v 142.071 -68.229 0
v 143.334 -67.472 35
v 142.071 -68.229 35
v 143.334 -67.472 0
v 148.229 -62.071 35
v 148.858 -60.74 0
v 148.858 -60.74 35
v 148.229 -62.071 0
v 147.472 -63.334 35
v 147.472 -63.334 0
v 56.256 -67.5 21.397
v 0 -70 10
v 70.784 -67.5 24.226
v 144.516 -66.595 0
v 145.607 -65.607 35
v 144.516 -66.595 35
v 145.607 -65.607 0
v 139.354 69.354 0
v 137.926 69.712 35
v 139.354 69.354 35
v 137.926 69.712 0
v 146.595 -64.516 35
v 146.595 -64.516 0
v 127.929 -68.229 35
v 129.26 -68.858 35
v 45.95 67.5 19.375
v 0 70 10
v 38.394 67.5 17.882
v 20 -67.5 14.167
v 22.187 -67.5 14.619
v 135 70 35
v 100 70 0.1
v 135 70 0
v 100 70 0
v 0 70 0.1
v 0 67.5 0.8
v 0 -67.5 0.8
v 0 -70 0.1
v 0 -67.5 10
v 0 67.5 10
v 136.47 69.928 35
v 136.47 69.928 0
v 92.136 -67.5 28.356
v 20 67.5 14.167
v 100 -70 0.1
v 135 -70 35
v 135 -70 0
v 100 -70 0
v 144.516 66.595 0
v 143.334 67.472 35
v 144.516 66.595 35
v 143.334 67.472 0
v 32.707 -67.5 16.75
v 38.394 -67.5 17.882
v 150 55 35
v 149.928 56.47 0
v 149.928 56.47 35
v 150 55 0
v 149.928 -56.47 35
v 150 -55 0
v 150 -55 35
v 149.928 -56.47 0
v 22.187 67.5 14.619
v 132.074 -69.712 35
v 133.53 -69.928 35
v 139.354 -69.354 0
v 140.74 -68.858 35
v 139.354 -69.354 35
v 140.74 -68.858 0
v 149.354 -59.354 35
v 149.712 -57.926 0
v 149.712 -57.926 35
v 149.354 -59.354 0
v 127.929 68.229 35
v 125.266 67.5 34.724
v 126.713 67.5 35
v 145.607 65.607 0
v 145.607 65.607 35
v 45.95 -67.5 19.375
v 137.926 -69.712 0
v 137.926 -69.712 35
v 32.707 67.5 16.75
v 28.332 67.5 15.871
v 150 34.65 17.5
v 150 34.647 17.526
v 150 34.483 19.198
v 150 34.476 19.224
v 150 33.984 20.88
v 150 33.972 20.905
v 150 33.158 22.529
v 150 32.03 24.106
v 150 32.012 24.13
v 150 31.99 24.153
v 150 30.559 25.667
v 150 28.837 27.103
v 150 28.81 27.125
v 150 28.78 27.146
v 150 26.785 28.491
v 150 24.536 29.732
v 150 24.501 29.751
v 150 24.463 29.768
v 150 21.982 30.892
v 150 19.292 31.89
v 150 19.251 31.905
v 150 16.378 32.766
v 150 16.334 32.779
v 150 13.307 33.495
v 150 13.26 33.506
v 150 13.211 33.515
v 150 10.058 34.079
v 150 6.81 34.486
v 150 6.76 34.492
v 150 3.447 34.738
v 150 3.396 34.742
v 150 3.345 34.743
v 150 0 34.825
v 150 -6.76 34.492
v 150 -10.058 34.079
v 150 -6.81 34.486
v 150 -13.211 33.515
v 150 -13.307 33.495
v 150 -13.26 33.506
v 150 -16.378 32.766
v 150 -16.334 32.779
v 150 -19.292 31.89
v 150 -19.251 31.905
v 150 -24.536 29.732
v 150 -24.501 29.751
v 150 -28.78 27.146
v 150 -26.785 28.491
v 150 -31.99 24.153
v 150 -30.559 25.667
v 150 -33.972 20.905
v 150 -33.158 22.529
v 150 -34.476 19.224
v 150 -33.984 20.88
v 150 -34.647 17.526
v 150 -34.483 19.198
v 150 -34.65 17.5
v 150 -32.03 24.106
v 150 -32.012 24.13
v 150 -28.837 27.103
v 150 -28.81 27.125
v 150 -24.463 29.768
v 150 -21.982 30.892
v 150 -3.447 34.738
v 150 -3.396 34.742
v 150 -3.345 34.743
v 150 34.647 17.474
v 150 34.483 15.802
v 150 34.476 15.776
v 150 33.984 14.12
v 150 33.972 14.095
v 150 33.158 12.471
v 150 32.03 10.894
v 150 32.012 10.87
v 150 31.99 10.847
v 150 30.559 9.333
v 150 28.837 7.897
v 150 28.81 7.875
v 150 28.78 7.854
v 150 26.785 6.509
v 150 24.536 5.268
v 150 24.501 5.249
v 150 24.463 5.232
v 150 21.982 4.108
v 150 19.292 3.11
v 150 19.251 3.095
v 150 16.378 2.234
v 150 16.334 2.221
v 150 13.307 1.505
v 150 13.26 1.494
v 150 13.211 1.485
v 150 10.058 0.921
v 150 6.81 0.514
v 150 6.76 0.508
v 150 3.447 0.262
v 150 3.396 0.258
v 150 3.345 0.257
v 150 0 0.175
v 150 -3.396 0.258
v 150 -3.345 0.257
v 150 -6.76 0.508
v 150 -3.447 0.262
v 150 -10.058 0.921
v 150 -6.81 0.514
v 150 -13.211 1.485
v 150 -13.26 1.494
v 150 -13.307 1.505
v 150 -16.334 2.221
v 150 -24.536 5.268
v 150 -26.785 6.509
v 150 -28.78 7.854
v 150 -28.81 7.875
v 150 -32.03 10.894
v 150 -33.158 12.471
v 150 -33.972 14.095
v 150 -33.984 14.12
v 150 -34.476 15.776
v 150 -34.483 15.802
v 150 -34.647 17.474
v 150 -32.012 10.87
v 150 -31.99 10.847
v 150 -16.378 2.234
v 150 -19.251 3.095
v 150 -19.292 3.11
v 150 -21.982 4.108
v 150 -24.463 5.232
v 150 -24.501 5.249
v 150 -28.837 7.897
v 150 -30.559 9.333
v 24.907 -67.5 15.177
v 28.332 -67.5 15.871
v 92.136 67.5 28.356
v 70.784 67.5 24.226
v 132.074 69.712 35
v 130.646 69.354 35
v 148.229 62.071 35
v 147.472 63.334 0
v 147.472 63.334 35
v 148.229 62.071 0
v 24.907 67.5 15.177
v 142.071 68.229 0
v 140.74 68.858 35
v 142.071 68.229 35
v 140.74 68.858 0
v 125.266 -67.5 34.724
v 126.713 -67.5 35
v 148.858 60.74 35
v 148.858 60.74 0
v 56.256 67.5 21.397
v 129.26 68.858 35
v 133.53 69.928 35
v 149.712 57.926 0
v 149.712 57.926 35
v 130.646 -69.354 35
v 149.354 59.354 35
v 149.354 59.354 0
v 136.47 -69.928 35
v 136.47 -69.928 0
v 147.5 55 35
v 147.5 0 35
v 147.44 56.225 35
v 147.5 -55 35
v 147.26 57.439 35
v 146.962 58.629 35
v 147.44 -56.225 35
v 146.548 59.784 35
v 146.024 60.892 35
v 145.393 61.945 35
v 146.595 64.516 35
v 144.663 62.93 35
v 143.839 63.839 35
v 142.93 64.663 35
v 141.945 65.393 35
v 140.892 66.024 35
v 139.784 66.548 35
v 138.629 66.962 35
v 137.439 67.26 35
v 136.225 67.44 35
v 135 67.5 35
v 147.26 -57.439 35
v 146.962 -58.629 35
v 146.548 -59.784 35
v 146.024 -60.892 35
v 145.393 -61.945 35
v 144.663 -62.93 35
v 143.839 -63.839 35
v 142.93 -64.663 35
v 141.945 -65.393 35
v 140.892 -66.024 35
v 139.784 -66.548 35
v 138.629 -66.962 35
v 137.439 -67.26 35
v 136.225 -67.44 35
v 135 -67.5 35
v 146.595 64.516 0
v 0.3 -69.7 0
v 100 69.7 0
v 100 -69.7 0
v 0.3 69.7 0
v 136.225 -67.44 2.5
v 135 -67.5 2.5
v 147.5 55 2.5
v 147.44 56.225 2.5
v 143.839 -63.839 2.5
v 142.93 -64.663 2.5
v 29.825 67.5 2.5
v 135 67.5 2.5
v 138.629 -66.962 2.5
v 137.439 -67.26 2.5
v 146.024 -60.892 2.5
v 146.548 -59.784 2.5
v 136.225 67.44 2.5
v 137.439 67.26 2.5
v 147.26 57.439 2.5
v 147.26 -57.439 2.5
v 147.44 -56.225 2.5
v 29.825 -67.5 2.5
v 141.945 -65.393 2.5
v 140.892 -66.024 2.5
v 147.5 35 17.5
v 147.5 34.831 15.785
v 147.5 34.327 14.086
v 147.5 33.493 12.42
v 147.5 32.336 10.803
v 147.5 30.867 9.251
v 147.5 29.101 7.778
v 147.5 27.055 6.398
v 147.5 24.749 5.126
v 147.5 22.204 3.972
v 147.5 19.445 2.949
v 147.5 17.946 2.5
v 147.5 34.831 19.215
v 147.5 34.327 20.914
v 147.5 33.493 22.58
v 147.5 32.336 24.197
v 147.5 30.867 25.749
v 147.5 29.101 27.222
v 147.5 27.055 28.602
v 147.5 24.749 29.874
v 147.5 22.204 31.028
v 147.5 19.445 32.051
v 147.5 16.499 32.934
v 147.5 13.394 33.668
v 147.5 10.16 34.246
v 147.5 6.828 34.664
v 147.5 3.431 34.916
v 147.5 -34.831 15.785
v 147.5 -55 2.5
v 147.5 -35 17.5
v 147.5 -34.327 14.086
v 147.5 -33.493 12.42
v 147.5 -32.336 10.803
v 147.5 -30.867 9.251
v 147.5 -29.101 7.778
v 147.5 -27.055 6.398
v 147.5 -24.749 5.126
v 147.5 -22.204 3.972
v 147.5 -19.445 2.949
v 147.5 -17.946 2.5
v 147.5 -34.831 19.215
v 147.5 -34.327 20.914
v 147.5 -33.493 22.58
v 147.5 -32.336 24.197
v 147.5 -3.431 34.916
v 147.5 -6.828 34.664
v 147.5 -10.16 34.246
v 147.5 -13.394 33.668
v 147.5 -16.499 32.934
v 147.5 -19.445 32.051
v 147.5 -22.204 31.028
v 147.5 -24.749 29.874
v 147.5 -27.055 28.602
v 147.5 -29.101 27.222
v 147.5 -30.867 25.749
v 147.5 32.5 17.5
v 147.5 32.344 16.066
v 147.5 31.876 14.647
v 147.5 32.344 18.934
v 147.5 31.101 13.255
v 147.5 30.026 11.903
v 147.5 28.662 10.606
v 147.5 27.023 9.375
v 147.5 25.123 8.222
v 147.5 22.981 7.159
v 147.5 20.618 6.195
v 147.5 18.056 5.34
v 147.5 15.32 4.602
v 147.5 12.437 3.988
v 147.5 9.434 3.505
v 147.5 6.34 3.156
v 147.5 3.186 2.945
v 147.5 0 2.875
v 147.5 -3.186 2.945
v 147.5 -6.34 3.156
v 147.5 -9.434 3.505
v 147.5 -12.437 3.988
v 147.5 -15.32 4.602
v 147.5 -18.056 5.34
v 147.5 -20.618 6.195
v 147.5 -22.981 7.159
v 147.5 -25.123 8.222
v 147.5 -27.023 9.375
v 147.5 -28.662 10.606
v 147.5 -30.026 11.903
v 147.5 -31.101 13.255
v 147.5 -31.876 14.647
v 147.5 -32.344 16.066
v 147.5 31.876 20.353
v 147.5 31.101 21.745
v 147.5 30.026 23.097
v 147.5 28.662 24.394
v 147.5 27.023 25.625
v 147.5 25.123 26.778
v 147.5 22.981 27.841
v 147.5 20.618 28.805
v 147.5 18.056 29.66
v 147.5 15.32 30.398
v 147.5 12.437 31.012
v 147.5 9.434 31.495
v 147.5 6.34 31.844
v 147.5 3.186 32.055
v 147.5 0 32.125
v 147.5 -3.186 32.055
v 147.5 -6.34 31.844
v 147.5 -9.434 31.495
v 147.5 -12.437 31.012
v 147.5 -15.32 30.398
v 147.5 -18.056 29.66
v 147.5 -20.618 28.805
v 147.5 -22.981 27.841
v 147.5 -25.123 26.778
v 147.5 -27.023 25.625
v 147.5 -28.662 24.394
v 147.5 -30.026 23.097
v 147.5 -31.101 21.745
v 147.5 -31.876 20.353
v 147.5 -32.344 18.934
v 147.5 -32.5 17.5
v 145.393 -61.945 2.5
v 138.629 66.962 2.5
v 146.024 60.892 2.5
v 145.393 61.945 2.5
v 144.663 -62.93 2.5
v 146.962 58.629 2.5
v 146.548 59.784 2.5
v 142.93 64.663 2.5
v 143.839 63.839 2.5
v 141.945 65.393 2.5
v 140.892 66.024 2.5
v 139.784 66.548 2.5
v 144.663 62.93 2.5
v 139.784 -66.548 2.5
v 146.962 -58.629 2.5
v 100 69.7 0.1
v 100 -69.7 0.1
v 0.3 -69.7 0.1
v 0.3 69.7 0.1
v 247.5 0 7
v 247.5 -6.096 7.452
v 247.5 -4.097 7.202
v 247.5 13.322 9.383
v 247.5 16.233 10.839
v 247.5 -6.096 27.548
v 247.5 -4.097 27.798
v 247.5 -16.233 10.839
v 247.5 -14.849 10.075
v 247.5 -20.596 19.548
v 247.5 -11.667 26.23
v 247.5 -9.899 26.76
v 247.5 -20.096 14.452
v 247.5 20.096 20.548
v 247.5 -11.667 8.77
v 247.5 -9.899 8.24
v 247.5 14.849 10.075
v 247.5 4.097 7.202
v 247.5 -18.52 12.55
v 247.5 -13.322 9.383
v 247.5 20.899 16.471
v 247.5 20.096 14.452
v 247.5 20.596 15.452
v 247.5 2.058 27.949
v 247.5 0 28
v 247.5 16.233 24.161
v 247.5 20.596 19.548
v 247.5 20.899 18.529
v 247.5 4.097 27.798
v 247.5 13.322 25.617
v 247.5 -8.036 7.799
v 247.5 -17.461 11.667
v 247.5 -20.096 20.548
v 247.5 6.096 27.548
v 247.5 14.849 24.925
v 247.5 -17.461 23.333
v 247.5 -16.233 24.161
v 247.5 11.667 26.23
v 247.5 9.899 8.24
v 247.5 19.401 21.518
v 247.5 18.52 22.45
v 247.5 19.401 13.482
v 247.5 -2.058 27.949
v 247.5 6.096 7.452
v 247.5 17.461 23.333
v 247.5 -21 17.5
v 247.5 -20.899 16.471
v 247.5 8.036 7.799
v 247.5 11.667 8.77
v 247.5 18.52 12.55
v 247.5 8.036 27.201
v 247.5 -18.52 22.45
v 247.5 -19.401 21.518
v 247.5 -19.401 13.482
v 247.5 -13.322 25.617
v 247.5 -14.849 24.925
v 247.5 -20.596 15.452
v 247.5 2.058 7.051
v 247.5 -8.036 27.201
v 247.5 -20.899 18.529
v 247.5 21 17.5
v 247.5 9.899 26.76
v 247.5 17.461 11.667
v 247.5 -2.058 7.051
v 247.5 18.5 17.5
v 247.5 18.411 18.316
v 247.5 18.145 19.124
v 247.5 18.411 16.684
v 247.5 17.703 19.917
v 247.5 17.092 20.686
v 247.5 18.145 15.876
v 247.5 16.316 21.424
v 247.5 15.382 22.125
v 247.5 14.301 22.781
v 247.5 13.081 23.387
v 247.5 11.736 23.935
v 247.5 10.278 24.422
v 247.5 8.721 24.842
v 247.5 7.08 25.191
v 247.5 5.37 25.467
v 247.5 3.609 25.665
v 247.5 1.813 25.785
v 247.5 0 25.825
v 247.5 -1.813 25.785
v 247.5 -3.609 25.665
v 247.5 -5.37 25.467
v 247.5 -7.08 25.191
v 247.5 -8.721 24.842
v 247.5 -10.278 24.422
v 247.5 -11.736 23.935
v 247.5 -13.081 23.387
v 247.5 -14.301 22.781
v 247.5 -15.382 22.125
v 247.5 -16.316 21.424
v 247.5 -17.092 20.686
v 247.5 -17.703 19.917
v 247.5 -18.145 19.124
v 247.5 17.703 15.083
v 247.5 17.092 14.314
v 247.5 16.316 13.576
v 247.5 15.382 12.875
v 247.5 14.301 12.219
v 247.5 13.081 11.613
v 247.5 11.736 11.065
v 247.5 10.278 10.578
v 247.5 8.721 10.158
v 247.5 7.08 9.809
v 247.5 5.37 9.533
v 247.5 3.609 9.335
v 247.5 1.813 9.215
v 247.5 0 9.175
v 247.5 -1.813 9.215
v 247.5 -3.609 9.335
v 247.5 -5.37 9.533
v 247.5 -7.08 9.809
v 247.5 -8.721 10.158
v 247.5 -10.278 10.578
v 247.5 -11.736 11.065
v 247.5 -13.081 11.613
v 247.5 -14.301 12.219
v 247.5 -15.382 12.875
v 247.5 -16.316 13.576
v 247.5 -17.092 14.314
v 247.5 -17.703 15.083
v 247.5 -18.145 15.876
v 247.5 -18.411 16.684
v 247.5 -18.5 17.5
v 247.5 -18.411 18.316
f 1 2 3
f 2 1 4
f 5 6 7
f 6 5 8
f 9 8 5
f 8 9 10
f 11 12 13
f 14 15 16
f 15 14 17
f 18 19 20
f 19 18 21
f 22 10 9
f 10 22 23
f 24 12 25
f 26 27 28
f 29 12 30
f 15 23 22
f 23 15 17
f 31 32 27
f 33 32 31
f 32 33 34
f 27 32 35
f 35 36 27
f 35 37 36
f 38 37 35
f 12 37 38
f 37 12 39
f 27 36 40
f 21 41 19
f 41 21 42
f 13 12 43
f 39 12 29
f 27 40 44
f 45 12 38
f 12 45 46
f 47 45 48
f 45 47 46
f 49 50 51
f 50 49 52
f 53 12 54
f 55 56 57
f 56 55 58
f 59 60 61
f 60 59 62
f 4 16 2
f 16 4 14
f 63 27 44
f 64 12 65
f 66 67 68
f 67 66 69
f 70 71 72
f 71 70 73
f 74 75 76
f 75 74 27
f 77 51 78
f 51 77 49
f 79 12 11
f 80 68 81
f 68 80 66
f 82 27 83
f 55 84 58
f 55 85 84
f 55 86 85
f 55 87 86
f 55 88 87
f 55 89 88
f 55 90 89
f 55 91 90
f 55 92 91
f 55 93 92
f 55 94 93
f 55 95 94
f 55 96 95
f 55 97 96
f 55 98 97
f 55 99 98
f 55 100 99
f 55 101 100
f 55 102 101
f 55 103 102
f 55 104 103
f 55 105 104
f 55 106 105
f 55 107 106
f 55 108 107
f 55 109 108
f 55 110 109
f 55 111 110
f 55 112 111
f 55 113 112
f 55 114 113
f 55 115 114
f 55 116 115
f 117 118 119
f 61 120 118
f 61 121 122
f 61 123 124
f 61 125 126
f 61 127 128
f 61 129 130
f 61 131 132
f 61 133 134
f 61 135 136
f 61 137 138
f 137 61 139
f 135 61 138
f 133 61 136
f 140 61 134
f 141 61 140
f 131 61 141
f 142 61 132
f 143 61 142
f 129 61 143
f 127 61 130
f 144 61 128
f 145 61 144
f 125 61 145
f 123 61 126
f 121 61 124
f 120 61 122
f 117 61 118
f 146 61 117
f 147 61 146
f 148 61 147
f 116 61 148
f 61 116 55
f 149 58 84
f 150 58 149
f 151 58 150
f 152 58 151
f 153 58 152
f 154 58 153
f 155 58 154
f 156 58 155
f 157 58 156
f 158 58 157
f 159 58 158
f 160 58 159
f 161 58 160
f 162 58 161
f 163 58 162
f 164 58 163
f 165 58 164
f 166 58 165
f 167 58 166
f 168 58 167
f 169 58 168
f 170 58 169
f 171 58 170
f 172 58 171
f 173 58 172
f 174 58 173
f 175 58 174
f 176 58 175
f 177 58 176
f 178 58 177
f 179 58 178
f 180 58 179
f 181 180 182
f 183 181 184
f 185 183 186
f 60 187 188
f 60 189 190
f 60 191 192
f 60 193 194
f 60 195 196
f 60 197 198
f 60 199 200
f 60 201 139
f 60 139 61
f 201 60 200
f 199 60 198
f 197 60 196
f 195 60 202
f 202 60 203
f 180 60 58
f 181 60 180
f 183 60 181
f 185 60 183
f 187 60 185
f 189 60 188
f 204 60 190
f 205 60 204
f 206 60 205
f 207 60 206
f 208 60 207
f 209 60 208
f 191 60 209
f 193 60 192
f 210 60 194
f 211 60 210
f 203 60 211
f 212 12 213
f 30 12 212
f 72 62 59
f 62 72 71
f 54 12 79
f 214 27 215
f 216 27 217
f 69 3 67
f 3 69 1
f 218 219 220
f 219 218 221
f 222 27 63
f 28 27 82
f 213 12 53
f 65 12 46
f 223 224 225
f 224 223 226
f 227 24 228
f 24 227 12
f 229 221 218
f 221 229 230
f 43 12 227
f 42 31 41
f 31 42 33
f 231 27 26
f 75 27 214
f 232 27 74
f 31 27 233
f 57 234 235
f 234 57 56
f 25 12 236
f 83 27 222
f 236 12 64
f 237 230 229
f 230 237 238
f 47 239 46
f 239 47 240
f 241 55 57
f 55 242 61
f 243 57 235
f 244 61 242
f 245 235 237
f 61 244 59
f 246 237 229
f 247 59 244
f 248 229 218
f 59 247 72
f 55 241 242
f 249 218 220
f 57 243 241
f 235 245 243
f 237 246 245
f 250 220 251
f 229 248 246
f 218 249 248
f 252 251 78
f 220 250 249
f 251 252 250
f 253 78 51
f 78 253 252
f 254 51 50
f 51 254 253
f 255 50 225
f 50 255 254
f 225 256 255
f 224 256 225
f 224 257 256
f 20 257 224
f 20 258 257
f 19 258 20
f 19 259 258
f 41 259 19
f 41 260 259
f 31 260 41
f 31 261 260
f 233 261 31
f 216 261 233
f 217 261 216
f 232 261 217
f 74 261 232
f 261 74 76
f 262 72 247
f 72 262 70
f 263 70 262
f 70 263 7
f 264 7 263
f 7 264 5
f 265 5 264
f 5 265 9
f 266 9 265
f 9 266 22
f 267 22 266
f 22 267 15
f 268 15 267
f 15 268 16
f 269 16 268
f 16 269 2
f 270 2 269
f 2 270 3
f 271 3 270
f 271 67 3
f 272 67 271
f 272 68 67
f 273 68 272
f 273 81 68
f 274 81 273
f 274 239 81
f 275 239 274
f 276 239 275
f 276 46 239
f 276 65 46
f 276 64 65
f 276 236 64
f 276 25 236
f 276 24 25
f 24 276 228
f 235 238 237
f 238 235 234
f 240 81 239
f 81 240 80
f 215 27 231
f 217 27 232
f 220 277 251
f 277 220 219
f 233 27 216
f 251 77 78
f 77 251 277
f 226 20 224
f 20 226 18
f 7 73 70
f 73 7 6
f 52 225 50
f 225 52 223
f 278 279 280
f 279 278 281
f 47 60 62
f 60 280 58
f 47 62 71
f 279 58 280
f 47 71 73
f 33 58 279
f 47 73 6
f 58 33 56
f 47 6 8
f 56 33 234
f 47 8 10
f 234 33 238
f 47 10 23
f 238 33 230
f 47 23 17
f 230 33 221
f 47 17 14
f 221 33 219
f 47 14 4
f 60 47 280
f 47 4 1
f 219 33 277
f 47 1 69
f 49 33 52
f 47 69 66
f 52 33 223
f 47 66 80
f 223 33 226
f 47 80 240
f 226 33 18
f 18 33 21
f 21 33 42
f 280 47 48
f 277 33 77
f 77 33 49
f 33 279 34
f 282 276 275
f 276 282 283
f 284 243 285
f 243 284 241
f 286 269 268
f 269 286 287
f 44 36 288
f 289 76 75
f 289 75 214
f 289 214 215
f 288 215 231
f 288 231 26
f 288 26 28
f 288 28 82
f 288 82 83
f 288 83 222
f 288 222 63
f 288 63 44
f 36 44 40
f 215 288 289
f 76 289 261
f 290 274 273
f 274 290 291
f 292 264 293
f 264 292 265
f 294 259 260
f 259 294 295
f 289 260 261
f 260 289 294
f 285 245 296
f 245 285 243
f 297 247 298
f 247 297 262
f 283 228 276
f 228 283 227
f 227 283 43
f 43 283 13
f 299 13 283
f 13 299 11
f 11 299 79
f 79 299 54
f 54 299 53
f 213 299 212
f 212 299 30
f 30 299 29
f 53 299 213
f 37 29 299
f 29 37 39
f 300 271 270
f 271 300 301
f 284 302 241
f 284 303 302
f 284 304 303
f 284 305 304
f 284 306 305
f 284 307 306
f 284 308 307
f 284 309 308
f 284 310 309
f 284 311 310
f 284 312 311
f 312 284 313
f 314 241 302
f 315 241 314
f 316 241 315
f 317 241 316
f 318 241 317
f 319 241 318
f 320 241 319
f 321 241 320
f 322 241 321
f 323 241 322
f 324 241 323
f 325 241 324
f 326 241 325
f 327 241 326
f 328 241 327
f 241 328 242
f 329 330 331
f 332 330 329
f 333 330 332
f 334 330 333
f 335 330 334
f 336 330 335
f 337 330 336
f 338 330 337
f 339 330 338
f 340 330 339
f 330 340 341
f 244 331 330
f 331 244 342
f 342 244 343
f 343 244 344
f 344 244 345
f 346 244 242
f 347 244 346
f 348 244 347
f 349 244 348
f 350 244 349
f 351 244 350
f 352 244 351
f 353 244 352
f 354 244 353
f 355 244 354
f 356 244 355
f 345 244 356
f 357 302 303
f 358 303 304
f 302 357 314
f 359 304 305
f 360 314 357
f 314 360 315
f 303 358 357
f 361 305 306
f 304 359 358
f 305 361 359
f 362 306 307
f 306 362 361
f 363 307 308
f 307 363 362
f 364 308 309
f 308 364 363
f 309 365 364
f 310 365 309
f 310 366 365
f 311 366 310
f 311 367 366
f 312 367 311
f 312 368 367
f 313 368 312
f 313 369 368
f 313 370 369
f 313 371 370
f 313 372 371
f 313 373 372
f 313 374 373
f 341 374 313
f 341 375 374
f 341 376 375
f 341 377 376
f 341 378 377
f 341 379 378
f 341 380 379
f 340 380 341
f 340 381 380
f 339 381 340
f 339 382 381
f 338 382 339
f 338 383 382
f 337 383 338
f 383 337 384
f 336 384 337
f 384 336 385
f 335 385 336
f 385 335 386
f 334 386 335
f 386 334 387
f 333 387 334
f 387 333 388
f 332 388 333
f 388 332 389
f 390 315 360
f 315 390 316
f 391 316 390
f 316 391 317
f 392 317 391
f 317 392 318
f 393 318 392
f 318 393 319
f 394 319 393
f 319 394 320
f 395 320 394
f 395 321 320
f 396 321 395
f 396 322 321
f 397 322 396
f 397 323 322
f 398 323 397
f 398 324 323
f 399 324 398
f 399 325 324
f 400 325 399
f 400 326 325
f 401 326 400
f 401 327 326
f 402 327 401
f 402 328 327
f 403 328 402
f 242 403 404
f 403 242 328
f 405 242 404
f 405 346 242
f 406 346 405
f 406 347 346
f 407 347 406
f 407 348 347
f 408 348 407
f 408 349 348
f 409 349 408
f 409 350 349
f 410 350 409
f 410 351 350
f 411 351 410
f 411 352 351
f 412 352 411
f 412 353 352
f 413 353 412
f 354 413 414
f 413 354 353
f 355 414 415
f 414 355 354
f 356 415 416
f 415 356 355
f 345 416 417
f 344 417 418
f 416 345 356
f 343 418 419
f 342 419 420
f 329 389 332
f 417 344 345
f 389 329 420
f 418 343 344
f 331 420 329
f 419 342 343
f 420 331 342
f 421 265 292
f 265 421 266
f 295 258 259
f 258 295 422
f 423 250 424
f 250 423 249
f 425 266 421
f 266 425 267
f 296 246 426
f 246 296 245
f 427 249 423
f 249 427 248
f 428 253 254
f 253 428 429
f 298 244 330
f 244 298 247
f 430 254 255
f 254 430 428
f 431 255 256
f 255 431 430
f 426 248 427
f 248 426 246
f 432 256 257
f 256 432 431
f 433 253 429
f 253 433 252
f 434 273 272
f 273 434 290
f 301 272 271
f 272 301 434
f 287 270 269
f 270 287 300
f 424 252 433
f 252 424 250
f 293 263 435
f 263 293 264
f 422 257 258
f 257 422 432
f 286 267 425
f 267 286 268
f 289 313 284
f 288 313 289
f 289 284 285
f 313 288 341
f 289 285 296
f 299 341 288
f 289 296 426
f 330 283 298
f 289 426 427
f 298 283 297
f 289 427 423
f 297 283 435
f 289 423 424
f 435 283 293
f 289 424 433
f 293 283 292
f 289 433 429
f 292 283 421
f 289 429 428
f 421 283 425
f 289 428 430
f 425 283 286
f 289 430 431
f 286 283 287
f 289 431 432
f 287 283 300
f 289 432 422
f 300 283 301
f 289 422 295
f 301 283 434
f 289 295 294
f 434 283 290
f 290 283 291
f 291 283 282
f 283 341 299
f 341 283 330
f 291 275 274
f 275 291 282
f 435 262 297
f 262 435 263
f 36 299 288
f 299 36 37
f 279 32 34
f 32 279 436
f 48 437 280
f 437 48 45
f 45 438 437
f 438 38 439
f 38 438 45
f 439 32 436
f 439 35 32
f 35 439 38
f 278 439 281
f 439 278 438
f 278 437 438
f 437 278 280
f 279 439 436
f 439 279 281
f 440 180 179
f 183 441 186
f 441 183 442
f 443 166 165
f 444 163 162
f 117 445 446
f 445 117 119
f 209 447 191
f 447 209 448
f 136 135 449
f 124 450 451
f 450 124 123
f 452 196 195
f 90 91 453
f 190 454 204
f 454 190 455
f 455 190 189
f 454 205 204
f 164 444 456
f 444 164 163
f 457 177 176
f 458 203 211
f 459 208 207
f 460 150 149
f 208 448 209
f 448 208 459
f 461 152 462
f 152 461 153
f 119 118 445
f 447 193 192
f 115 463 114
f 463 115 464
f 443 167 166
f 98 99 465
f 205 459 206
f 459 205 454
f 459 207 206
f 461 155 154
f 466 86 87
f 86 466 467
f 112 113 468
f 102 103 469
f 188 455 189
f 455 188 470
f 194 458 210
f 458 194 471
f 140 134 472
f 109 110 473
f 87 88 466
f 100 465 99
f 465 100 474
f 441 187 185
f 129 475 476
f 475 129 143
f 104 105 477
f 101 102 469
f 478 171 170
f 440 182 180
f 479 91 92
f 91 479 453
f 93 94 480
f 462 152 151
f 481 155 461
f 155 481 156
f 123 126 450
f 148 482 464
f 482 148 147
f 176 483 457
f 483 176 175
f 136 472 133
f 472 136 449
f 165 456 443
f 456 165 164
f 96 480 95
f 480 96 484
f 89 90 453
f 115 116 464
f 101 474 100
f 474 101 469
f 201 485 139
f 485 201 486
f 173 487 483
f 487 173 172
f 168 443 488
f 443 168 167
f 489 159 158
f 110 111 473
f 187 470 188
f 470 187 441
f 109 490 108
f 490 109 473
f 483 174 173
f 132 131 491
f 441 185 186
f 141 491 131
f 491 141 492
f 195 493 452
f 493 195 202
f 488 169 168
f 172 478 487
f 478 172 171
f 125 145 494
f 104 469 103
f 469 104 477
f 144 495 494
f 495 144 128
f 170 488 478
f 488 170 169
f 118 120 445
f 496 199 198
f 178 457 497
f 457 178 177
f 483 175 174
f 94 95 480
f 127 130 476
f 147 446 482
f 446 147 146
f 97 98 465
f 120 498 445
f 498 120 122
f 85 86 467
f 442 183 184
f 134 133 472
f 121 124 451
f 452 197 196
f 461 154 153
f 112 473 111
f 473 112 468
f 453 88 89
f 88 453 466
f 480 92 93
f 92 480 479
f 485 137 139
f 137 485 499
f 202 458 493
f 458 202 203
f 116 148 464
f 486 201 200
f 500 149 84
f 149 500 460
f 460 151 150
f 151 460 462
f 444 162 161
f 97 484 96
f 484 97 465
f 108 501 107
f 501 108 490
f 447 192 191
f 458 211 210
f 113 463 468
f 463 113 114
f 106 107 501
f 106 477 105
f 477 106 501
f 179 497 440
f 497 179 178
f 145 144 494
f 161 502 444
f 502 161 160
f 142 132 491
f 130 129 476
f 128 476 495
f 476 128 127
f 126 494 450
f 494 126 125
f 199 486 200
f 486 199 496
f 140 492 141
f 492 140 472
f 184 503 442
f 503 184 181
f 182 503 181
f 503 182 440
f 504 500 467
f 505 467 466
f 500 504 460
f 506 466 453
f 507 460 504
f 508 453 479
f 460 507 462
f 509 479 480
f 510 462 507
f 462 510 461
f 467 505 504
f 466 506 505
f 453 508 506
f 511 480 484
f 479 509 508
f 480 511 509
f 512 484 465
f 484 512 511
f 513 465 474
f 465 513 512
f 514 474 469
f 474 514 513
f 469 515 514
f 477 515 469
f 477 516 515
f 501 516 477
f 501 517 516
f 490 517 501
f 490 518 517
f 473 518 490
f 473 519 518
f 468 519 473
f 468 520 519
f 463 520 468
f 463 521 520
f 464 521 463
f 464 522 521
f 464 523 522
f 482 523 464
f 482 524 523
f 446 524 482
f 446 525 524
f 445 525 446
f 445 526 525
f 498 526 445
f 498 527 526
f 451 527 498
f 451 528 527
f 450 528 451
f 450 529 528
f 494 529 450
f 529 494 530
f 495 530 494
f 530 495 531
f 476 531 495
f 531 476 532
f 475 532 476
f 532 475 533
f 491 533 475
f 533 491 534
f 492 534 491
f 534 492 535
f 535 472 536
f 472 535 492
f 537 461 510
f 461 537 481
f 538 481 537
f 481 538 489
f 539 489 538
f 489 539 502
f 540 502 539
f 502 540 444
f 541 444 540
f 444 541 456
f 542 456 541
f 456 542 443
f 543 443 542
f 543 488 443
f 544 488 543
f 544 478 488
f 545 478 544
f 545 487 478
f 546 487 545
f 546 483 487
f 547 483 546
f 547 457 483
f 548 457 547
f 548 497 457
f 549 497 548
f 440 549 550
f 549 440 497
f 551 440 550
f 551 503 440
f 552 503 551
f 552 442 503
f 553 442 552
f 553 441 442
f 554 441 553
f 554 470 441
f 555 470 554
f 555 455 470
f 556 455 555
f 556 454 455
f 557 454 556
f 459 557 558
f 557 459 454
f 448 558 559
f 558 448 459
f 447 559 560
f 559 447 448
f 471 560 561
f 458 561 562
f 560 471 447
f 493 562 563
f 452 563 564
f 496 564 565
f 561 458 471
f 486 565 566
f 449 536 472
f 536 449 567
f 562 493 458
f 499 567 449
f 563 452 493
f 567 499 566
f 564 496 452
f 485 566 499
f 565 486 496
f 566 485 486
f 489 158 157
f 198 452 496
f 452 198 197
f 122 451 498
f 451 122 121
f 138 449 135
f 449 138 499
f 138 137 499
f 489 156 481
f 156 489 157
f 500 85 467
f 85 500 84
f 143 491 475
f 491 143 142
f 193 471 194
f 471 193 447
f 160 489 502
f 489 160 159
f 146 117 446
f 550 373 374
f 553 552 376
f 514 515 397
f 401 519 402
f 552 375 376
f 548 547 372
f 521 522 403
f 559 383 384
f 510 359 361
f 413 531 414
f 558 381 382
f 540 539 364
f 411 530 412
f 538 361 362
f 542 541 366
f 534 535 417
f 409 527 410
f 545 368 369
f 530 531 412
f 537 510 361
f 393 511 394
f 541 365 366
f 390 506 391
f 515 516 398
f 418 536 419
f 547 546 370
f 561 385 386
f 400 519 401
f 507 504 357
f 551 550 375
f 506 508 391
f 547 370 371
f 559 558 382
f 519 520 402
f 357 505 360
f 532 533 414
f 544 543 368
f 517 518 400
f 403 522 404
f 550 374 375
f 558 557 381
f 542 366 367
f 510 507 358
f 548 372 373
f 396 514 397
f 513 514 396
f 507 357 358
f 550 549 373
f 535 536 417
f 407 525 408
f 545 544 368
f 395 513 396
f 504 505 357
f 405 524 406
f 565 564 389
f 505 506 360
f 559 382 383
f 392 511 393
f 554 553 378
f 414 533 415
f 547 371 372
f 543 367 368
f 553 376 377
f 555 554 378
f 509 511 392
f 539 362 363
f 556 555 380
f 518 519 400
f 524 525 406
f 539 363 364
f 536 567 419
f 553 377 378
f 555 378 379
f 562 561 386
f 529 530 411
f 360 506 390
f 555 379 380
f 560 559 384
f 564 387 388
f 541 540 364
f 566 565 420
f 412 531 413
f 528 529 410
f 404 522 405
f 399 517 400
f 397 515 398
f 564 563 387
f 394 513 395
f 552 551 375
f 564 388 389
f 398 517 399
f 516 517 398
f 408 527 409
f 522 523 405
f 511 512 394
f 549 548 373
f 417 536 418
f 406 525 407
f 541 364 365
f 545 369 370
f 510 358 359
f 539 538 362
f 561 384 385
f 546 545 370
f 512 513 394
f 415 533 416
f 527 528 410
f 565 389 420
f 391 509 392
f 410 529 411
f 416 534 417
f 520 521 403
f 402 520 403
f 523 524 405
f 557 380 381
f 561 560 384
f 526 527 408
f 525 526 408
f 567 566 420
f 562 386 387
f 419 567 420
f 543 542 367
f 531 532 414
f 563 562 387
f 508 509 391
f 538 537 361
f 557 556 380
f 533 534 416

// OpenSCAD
$fn=64;

// Width at the opening, includes wall thickness.
width = 140;
// Length including wall thickness.
length = 150;
// Length of the handle.
handle_length = 100;
// Wall height at the closed end
height = 35;
// Wall height at the open end.
front_height = 10;
// Radius of the two corners at the closed end.
corner_radius=15;
// Wall thickness
wall_thickness = 2.5;
// Base thickness
base_thickness = 2.5;
// Reduced base thickness at the open end.
slope_height = 0.8;
// Length of base slope at the open end.
slope_length = 30;
// Inset first layer by this dimension (0 to disable). Helps prevnting
// 'elephant foot' syndrom.
first_layer_inset_width = 0.3;
// Height of first layer. Ignored if first_layer_inset_width is zero or negative.
first_layer_inset_height = 0.2;

eps1 = 0.01 + 0;  // hide on thingiverse customizer.
eps2 = 2*eps1;


// Operator to inset first layer to eliminate elephant foot.
// Children are assumed to be on the z=0 plane.
module inset_first_layer(w=0.4, h=0.2, eps=0.01) {
  if (w == 0 || h < 0) {
    children();
  } else {
    difference() {
      children();  
      // TODO: use actual extended children projection instead
      // of a clube with arbitrary large x,y values.
      cube([200, 200, h], center=true);
    }
    linear_extrude(height=h+eps) 
      offset(r = -w) 
        projection(cut=true) 
          children();  
  }
}

module block() {
  hull() {
    translate([length-corner_radius, width/2-corner_radius, 0]) 
        cylinder(r=corner_radius, h=height);
    translate([length-corner_radius, -(width/2-corner_radius), 0]) 
        cylinder(r=corner_radius, h=height);
    
    translate([0, -width/2, 0]) cube([eps1, width, front_height]);
  }
}

module hollow() {
  w = width - 2*wall_thickness;
  l = length - wall_thickness;
  r = corner_radius - wall_thickness;
  
  hull() {
    translate([l-r, w/2-r, base_thickness]) 
        cylinder(r=r, h=height);
    translate([l-r, -(w/2-r), base_thickness]) 
        cylinder(r=r, h=height);
    translate([-eps1, -w/2, base_thickness]) cube([eps1, w, height]);
  }
}

module slope() {
  w = width - 2*wall_thickness;
  hull() {
    translate([-eps1, -w/2, slope_height]) 
        cube([eps1, w, height]);
    translate([slope_length-eps1, -w/2, base_thickness+eps1]) 
        cube([eps1, w, height]);
  }
}

module main() {
  inset_first_layer(first_layer_inset_width, first_layer_inset_height) {
    difference() {
      block();
      hollow();
      slope();
    }
  }
}

difference() {
    union() {
translate([length-wall_thickness,0,height/2])rotate([0,90,0])scale([.5,1,1])cylinder(handle_length,height,height*.6);
    main();
    }
      
translate([length-wall_thickness,0,height/2])rotate([0,90,0])scale([.45,1,1])cylinder(handle_length,height-wall_thickness,height*.6-wall_thickness);
    }
//main();
